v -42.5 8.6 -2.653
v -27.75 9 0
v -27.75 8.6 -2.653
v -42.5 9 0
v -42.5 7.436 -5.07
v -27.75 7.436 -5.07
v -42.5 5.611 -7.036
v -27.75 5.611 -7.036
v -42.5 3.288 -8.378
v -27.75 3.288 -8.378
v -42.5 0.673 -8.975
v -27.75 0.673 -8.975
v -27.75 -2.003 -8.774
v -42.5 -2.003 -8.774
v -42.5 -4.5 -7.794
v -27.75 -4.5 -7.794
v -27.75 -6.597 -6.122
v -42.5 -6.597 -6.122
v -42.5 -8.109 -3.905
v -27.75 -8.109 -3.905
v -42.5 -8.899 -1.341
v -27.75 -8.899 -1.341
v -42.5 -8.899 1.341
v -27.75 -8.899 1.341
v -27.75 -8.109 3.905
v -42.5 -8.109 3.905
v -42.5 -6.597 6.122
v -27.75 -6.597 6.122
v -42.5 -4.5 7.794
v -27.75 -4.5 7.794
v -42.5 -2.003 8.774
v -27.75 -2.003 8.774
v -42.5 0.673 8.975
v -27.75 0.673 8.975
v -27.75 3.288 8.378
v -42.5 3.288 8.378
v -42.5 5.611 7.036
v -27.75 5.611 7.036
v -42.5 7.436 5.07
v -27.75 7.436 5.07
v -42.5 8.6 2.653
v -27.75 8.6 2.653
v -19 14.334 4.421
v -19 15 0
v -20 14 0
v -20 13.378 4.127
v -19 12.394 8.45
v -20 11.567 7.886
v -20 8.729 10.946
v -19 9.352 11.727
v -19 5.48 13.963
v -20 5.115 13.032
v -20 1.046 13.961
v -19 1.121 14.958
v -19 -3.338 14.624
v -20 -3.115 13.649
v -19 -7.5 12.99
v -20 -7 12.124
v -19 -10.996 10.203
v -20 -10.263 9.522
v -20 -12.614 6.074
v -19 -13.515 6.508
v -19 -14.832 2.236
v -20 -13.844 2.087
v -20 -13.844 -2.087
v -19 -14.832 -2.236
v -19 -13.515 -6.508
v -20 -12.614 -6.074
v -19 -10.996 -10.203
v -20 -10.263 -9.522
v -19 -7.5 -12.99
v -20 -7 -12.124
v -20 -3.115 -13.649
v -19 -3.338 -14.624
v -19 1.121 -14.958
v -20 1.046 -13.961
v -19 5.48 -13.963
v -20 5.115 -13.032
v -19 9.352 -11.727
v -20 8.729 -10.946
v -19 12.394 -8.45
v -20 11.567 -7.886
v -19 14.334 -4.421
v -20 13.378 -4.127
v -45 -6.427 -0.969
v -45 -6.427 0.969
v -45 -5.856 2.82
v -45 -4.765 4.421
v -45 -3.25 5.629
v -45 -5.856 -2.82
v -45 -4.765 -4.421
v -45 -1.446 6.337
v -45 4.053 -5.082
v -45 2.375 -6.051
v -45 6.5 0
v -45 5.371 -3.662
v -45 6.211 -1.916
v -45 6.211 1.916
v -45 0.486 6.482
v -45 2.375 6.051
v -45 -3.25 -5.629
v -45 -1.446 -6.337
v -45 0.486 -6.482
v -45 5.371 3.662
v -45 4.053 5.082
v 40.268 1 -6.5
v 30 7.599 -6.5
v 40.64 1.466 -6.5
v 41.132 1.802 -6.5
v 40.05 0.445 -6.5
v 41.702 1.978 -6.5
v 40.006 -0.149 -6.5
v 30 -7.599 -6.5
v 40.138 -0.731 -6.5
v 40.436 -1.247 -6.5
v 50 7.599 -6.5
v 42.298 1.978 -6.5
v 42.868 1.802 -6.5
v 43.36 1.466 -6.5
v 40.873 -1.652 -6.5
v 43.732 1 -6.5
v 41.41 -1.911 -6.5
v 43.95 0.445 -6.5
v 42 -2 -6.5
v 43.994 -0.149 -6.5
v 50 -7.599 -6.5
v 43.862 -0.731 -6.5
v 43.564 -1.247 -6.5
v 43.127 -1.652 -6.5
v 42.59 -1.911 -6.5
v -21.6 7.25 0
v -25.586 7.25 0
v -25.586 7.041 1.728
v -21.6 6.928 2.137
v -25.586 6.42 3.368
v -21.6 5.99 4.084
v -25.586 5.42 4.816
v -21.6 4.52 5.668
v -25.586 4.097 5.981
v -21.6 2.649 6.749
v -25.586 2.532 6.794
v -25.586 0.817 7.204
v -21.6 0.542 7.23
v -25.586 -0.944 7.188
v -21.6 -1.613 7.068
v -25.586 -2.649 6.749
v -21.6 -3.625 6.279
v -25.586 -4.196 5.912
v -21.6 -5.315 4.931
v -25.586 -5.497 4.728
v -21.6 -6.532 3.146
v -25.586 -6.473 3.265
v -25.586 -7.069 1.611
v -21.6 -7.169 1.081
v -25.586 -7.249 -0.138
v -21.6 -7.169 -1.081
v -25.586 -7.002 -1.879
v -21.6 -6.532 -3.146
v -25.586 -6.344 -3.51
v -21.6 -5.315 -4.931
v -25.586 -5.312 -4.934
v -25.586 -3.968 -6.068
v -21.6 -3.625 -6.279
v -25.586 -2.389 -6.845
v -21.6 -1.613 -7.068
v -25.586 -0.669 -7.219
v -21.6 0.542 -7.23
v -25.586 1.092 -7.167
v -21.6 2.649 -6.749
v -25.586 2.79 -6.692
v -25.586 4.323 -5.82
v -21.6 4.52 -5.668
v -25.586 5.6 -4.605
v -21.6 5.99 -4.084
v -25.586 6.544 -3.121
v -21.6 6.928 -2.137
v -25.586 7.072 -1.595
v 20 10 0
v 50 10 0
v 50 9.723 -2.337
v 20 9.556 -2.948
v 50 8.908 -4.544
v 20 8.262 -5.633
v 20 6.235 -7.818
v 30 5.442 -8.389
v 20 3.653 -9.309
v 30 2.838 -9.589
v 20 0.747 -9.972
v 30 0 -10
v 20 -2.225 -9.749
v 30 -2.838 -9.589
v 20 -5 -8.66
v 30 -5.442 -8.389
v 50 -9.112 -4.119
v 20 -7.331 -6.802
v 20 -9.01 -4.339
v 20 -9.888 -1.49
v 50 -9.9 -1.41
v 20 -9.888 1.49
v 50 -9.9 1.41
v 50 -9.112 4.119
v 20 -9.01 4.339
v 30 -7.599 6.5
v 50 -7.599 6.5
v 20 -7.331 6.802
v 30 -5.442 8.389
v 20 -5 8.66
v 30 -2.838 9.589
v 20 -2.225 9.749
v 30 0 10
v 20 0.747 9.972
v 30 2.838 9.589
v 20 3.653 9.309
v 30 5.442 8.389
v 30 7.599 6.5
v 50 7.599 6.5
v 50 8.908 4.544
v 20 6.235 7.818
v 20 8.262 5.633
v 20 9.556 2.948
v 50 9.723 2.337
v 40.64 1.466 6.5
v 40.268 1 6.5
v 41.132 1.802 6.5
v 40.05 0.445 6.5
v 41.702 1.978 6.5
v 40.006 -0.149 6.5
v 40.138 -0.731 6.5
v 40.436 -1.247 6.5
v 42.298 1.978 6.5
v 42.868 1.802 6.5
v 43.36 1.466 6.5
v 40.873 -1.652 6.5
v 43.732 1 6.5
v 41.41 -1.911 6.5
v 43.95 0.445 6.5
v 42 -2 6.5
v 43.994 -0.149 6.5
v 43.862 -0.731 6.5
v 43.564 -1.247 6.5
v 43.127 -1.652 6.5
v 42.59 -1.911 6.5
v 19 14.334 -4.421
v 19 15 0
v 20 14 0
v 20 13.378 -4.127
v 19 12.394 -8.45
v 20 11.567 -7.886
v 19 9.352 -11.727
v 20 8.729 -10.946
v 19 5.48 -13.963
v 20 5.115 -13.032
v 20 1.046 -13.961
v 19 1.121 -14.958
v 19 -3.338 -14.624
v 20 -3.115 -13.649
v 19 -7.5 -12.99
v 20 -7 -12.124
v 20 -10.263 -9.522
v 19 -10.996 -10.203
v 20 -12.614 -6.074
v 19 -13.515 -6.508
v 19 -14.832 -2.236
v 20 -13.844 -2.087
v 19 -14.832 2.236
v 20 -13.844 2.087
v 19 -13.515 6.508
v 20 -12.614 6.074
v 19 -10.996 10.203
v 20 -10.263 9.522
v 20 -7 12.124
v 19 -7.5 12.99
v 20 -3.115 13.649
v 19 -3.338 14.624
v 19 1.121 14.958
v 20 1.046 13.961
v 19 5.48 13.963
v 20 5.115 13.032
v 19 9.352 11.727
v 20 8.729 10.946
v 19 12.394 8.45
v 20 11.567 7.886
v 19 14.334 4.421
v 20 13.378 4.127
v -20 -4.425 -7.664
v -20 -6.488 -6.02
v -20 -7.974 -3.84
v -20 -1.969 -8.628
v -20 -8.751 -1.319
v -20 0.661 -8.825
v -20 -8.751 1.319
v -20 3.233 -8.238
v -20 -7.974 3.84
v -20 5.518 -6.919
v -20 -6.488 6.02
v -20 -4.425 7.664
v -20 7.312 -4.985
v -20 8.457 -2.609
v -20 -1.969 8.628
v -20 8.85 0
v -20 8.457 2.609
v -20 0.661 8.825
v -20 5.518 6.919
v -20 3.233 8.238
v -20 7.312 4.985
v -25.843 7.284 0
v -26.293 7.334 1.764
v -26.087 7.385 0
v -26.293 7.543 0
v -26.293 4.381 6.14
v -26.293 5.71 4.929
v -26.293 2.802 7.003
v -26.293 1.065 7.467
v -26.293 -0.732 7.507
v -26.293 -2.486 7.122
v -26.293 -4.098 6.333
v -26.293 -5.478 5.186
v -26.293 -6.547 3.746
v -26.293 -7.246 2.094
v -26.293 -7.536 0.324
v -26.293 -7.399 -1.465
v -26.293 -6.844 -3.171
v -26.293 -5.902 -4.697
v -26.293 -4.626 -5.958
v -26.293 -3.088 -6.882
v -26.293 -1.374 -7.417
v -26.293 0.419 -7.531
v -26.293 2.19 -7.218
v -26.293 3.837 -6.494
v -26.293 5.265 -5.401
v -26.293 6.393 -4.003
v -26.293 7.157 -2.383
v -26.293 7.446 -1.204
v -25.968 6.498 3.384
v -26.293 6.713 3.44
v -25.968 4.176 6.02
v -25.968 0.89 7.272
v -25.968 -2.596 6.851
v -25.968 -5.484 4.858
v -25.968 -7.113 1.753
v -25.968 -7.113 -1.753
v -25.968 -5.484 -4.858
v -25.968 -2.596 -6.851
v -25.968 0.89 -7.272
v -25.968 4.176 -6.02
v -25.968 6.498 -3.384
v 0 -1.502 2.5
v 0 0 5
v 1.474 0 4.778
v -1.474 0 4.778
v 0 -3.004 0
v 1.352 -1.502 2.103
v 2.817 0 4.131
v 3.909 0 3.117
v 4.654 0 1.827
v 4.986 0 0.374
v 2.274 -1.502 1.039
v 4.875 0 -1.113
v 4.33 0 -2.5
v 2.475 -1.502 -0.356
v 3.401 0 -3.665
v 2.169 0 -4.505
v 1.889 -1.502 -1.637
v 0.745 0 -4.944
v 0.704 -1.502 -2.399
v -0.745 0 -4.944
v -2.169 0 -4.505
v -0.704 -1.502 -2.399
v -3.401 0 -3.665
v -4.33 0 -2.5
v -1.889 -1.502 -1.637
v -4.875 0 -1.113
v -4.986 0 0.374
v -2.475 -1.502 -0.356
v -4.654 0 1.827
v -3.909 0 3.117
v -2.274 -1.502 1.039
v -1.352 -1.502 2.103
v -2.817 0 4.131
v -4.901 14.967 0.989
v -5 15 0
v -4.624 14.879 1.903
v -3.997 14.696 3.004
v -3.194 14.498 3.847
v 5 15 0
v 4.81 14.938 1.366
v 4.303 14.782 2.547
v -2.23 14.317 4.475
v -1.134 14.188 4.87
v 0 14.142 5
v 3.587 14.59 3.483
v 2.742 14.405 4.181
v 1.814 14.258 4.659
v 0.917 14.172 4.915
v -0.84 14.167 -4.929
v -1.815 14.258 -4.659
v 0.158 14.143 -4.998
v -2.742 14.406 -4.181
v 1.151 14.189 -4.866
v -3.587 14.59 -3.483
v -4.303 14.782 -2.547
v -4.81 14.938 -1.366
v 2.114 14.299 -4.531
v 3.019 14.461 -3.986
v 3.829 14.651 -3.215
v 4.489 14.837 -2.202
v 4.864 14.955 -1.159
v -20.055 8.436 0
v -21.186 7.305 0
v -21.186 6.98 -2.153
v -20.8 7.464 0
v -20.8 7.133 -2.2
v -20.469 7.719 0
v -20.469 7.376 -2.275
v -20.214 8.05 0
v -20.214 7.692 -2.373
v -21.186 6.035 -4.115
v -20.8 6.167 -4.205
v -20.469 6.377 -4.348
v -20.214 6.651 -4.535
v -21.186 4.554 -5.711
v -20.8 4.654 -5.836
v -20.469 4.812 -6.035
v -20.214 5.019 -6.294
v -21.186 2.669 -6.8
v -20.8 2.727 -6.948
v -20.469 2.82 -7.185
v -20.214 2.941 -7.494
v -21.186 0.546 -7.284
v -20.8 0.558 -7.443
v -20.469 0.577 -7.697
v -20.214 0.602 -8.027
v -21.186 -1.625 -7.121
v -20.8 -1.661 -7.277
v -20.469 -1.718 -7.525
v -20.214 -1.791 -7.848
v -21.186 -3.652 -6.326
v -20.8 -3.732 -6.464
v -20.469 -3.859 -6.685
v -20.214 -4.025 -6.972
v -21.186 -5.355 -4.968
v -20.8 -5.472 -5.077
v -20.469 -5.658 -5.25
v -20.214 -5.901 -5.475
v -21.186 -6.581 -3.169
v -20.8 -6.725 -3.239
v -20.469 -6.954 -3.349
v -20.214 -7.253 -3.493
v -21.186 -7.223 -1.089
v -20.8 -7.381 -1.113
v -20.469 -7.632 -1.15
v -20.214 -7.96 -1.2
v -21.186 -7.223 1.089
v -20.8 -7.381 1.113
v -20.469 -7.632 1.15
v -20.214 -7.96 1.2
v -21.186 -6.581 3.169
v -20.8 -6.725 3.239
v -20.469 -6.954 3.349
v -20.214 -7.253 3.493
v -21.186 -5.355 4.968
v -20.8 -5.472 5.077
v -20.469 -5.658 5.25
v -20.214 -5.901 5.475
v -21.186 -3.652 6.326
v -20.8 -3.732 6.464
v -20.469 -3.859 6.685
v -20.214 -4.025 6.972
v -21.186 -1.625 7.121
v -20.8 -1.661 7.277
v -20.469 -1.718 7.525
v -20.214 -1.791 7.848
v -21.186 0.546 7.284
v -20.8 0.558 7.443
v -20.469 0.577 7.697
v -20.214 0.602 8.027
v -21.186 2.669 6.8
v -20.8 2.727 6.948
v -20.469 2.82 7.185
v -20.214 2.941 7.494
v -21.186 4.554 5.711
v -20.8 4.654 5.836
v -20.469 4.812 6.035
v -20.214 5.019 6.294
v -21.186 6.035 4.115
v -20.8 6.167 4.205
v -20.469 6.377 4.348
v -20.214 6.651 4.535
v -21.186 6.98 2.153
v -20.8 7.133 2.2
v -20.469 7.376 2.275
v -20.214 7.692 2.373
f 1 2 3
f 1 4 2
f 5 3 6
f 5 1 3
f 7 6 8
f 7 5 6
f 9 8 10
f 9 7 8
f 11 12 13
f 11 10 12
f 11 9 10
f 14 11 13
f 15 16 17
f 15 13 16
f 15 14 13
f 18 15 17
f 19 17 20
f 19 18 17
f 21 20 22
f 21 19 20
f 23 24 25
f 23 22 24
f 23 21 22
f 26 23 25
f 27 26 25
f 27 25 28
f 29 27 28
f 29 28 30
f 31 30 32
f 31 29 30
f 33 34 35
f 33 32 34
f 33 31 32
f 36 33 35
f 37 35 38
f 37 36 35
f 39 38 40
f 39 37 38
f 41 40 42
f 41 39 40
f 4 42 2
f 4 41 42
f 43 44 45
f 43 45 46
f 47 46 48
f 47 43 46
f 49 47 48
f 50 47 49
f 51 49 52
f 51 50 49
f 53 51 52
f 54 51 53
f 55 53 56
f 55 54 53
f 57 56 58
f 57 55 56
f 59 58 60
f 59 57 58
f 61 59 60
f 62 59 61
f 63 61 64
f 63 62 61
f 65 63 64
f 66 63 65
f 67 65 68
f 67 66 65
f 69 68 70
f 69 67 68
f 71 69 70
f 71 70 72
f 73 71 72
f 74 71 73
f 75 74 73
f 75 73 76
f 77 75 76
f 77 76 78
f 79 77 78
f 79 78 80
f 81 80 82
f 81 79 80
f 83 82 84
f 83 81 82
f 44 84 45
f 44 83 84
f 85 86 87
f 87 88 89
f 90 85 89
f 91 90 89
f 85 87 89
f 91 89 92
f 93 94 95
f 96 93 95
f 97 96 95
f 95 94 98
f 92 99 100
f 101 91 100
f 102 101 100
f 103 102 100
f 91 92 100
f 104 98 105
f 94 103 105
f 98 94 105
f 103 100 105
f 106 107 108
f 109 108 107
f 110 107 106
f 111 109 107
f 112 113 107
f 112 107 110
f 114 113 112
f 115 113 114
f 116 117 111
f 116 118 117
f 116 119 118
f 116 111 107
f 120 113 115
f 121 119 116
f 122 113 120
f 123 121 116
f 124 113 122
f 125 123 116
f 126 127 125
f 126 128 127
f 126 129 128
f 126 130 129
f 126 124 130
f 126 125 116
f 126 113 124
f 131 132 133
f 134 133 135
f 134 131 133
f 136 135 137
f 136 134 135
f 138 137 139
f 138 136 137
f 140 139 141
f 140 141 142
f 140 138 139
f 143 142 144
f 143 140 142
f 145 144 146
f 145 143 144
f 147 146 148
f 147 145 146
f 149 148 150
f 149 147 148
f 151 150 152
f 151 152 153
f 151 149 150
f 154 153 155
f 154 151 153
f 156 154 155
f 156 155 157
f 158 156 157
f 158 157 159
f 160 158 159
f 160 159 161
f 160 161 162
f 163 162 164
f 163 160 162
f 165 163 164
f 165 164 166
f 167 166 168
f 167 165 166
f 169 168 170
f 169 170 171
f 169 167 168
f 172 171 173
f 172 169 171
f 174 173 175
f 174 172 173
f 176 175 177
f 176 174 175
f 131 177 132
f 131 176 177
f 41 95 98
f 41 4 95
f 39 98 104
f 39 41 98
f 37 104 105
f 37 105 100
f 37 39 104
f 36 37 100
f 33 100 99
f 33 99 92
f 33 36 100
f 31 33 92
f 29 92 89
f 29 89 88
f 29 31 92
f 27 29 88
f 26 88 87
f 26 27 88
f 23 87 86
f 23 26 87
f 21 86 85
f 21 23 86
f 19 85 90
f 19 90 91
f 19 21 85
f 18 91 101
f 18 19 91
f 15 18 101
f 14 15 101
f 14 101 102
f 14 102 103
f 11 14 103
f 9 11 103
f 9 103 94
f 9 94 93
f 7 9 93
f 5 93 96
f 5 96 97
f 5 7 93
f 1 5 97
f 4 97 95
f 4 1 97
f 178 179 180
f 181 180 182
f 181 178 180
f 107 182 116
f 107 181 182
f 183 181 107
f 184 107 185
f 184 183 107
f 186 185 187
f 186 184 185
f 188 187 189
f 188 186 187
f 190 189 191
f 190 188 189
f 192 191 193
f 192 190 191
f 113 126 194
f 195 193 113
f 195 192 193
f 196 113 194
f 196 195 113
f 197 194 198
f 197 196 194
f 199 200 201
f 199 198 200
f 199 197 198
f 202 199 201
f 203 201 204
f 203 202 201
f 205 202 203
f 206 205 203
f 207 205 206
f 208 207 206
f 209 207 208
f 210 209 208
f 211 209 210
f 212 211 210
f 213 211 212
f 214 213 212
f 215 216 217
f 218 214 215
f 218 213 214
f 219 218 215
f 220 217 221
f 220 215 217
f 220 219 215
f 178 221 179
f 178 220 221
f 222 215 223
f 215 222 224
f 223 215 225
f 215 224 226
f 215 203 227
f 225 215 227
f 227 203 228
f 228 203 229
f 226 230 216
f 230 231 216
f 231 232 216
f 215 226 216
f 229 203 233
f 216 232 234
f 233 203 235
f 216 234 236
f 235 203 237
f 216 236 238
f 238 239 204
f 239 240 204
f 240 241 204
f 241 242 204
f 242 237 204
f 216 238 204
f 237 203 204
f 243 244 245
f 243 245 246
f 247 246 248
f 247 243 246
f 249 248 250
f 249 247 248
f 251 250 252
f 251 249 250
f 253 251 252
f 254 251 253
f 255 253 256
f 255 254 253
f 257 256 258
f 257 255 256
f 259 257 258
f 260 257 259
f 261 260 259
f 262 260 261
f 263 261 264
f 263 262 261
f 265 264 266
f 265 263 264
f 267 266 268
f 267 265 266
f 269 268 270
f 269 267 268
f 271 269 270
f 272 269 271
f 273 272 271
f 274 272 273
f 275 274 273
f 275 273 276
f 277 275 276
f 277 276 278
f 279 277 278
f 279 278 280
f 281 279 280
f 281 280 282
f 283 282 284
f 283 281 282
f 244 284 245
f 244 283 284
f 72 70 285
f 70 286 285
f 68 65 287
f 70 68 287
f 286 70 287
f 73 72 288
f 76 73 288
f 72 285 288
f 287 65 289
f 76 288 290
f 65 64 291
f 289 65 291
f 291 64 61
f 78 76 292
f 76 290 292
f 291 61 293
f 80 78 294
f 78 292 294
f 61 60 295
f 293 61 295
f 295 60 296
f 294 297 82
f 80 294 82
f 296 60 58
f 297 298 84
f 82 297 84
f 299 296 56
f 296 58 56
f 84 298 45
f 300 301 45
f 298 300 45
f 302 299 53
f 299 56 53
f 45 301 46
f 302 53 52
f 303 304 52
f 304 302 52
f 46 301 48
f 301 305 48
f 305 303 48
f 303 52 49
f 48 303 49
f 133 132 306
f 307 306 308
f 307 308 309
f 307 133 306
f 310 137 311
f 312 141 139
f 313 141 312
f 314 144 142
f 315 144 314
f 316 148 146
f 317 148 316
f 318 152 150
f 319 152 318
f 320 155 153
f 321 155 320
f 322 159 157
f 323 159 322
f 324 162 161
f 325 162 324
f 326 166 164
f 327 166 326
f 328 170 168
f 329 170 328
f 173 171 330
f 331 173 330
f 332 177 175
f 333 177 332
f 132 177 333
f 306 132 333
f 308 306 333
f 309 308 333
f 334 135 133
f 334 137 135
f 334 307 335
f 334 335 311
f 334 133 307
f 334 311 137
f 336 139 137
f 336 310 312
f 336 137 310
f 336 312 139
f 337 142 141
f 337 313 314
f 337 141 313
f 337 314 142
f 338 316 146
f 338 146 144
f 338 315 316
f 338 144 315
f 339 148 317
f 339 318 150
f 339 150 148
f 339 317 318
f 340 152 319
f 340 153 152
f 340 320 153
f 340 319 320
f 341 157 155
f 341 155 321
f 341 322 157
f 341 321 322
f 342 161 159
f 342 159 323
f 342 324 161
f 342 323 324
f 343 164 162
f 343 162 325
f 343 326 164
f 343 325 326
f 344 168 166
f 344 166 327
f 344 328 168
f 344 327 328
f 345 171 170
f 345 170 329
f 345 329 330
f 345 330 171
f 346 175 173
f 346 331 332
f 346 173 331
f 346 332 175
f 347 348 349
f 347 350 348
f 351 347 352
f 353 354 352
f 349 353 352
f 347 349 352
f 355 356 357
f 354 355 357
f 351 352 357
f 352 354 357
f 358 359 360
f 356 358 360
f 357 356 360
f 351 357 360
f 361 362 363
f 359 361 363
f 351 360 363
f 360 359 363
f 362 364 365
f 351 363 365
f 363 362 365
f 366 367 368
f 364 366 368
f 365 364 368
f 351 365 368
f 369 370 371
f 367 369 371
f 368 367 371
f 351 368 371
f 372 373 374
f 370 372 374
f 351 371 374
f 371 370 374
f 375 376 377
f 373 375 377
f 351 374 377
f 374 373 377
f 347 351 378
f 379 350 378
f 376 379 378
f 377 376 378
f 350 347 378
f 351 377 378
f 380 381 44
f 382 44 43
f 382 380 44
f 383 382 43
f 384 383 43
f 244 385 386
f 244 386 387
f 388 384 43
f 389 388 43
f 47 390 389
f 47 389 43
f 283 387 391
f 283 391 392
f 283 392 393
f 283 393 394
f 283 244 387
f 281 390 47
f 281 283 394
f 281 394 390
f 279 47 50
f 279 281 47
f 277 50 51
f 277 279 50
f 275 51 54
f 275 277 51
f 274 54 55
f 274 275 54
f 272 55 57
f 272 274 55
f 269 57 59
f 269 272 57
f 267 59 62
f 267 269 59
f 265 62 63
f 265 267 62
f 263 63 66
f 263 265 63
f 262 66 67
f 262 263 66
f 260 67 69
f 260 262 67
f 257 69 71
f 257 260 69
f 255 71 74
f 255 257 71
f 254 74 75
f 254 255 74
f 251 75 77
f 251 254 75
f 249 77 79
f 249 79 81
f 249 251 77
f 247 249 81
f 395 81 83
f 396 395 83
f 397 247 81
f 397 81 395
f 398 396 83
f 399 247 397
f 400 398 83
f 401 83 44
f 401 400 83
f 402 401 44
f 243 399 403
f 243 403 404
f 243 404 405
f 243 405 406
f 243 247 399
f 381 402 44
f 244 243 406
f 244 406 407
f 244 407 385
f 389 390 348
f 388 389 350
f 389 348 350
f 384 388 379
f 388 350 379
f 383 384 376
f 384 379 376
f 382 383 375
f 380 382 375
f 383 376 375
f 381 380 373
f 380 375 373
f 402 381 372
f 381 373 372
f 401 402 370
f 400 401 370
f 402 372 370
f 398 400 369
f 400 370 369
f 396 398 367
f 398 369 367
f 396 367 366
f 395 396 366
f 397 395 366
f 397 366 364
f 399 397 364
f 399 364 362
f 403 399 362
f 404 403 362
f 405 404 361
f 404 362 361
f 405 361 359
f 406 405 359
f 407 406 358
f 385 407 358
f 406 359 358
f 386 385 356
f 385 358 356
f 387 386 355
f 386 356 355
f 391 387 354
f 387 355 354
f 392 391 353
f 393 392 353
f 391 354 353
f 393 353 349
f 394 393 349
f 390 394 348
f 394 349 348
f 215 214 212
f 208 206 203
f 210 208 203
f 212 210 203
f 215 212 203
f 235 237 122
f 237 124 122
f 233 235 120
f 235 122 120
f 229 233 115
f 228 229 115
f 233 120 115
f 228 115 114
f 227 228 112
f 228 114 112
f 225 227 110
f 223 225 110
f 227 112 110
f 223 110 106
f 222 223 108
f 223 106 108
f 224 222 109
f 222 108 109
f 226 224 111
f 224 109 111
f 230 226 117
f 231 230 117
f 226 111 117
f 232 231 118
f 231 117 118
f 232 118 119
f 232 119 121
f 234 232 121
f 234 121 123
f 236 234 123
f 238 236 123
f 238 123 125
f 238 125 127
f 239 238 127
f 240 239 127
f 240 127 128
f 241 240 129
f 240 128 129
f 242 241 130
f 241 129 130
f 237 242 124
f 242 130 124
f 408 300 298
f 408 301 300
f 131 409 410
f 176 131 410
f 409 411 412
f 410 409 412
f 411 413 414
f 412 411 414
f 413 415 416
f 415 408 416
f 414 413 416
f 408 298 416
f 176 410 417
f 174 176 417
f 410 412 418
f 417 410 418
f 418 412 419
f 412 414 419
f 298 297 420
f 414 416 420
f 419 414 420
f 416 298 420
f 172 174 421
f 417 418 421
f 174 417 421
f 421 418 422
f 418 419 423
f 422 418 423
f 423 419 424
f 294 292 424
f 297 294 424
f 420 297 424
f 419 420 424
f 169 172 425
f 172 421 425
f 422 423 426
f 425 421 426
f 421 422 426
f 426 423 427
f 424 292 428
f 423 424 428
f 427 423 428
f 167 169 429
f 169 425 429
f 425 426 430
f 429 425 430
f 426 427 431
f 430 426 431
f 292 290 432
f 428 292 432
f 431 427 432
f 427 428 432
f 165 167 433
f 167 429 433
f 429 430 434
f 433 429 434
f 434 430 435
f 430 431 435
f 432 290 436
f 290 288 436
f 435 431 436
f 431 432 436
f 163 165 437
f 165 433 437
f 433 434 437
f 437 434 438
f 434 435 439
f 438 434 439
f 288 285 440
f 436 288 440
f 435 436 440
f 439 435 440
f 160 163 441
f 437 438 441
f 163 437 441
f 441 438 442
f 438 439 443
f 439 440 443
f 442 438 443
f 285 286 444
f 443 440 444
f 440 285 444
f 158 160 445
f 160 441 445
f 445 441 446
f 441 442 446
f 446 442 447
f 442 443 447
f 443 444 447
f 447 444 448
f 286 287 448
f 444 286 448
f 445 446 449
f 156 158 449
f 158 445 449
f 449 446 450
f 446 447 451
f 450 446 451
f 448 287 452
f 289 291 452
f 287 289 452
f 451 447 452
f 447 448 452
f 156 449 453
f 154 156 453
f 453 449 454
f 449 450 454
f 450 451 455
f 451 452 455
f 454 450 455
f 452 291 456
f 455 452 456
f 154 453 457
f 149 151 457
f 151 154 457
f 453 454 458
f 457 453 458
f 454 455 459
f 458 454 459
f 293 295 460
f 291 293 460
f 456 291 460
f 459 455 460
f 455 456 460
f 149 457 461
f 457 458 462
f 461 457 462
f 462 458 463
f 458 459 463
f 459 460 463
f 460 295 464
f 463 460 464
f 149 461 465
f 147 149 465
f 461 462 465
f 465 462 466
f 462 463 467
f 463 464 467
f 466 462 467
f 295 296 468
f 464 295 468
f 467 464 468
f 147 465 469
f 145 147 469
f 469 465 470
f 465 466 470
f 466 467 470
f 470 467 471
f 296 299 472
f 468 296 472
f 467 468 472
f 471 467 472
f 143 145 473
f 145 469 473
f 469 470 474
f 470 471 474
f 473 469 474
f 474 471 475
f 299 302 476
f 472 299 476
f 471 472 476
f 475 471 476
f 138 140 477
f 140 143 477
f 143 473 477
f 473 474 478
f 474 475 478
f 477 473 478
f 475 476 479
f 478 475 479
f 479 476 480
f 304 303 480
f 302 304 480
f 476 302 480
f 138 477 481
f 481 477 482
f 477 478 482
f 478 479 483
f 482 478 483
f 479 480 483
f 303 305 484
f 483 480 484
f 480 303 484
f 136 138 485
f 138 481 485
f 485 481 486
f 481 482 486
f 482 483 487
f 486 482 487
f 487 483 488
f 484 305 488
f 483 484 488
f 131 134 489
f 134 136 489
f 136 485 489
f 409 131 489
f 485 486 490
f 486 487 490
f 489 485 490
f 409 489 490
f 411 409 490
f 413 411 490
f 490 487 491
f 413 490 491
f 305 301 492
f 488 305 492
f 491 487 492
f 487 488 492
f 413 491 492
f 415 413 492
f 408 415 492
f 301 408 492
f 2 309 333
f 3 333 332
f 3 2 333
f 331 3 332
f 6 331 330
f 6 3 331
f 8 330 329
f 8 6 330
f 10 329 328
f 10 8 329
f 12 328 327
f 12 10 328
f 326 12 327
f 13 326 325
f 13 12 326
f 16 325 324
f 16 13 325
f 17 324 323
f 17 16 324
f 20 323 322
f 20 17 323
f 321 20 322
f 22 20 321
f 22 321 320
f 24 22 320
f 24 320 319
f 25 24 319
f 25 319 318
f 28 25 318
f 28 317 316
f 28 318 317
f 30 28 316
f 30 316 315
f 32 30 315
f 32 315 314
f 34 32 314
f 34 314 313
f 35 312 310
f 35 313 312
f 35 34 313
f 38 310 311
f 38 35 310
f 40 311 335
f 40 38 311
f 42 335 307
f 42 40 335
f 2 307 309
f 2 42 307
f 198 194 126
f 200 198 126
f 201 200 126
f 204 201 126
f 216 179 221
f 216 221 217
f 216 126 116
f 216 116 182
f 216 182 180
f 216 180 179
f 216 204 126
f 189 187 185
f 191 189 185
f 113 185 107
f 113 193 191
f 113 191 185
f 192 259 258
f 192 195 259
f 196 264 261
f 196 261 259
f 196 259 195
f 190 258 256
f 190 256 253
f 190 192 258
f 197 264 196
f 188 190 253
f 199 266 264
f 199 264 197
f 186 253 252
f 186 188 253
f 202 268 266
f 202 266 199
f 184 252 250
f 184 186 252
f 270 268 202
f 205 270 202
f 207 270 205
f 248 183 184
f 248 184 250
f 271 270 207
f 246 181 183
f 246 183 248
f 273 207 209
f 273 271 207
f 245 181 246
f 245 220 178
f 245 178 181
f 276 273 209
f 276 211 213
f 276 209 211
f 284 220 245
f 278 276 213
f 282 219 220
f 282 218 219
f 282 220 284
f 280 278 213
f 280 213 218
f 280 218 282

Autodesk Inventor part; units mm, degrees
ref_plane "YZ Plane" through (0, 0, 0) normal (1, 0, 0) x (0, 1, 0)
ref_plane "XY Plane" through (0, 0, 0) normal (0, 0, 1) x (1, 0, 0)
sketch "Эскиз2" plane through (0, 0, 0) normal (0, 0, 1) x (1, 0, 0)
  line L0 (-45, 0) -> (-45, 9)
  line L1 (-27.75, 9) -> (-45, 9)
  line L2 (-26, 7.25) -> (-20, 7.25)
  line L3 (-20, 7.25) -> (-20, 14)
  line L4 (-19, 15) -> (20, 15)
  line L5 (-26, 7.25) -> (-27.75, 9)
  line L6 (50, 10) -> (50, 0)
  line L7 (50, 10) -> (20, 10)
  line L8 (20, 10) -> (20, 14)
  line L9 (-45, 0) -> (50, 0)
  line L10 (-20, 14) -> (-20, 15)
  line L11 (-20, 15) -> (-19, 15)
  line L12 (20, 15) -> (20, 14)
  point P0 (0, 0)
  point P1 (0, 15)
  dimension "d1" = 9
  dimension "d15" = 6
  dimension "d16" = 19
  dimension "d22" = 10
  dimension "d23" = 20
  dimension "d41" = 25
  dimension "d42" = 17.25
  dimension "d57" = 20
  dimension "d58" = 70
revolve "Вращение1" add sketch "Эскиз2" angle 360 about axis through (-45, 0, 0) along (1, 0, 0)
sketch "Эскиз3" plane through (0, 0, 0) normal (0, 1, 0) x (-1, 0, 0)
  line L0 (-50, -10) -> (-30, -10)
  line L1 (-30, -10) -> (-30, -6.5)
  line L2 (-30, -6.5) -> (-50, -6.5)
  line L3 (-50, -6.5) -> (-50, -10)
  line L4 (-50, 10) -> (-30, 10)
  line L5 (-30, 10) -> (-30, 6.5)
  line L6 (-30, 6.5) -> (-50, 6.5)
  line L7 (-50, 6.5) -> (-50, 10)
  point P0 (0, 0)
extrude "Выдавливание1" cut sketch "Эскиз3" along normal mid plane 44.25
sketch "Эскиз4" plane through (0, 0, 0) normal (0, 0, 1) x (1, 0, 0)
  line L0 (50, 7.5993) -> (50, -7.5993) projected
  point P0 (0, 0)
  point P1 (42, 0)
hole "Отверстие1" at (42, 0, 0) direction (0, 0, -1) diameter 4 end through all both
thread "Резьба1" size "M18x2.5" class "6g" standard "ISO Metric profile" full length
chamfer "Фаска1" distance 2.5 angle 45 1 edges at (-45, -9, 0)
ref_plane "РабПлоскость1" through (0, 15, 0) normal (0, 1, 0) x (-1, 0, 0)
fillet "Сопряжение1" radius 1.6 1 edges at (-20, -7.25, 0)
fillet "Сопряжение2" radius 1 1 edges at (-26, -7.25, 0)
chamfer "Фаска2" distance 1 angle 45 2 edges at (20, -15, 0) (-20, -15, 0)
sketch "Эскиз6" plane through (0, 15, 0) normal (0, 1, 0) x (-1, 0, 0)
  point P0 (0, 0)
  point P1 (0, 0)
hole "Отверстие3" at (0, 15, 0) direction (0, -1, 0) diameter 10 depth 15 tip angle 118
properties part number "вал"
